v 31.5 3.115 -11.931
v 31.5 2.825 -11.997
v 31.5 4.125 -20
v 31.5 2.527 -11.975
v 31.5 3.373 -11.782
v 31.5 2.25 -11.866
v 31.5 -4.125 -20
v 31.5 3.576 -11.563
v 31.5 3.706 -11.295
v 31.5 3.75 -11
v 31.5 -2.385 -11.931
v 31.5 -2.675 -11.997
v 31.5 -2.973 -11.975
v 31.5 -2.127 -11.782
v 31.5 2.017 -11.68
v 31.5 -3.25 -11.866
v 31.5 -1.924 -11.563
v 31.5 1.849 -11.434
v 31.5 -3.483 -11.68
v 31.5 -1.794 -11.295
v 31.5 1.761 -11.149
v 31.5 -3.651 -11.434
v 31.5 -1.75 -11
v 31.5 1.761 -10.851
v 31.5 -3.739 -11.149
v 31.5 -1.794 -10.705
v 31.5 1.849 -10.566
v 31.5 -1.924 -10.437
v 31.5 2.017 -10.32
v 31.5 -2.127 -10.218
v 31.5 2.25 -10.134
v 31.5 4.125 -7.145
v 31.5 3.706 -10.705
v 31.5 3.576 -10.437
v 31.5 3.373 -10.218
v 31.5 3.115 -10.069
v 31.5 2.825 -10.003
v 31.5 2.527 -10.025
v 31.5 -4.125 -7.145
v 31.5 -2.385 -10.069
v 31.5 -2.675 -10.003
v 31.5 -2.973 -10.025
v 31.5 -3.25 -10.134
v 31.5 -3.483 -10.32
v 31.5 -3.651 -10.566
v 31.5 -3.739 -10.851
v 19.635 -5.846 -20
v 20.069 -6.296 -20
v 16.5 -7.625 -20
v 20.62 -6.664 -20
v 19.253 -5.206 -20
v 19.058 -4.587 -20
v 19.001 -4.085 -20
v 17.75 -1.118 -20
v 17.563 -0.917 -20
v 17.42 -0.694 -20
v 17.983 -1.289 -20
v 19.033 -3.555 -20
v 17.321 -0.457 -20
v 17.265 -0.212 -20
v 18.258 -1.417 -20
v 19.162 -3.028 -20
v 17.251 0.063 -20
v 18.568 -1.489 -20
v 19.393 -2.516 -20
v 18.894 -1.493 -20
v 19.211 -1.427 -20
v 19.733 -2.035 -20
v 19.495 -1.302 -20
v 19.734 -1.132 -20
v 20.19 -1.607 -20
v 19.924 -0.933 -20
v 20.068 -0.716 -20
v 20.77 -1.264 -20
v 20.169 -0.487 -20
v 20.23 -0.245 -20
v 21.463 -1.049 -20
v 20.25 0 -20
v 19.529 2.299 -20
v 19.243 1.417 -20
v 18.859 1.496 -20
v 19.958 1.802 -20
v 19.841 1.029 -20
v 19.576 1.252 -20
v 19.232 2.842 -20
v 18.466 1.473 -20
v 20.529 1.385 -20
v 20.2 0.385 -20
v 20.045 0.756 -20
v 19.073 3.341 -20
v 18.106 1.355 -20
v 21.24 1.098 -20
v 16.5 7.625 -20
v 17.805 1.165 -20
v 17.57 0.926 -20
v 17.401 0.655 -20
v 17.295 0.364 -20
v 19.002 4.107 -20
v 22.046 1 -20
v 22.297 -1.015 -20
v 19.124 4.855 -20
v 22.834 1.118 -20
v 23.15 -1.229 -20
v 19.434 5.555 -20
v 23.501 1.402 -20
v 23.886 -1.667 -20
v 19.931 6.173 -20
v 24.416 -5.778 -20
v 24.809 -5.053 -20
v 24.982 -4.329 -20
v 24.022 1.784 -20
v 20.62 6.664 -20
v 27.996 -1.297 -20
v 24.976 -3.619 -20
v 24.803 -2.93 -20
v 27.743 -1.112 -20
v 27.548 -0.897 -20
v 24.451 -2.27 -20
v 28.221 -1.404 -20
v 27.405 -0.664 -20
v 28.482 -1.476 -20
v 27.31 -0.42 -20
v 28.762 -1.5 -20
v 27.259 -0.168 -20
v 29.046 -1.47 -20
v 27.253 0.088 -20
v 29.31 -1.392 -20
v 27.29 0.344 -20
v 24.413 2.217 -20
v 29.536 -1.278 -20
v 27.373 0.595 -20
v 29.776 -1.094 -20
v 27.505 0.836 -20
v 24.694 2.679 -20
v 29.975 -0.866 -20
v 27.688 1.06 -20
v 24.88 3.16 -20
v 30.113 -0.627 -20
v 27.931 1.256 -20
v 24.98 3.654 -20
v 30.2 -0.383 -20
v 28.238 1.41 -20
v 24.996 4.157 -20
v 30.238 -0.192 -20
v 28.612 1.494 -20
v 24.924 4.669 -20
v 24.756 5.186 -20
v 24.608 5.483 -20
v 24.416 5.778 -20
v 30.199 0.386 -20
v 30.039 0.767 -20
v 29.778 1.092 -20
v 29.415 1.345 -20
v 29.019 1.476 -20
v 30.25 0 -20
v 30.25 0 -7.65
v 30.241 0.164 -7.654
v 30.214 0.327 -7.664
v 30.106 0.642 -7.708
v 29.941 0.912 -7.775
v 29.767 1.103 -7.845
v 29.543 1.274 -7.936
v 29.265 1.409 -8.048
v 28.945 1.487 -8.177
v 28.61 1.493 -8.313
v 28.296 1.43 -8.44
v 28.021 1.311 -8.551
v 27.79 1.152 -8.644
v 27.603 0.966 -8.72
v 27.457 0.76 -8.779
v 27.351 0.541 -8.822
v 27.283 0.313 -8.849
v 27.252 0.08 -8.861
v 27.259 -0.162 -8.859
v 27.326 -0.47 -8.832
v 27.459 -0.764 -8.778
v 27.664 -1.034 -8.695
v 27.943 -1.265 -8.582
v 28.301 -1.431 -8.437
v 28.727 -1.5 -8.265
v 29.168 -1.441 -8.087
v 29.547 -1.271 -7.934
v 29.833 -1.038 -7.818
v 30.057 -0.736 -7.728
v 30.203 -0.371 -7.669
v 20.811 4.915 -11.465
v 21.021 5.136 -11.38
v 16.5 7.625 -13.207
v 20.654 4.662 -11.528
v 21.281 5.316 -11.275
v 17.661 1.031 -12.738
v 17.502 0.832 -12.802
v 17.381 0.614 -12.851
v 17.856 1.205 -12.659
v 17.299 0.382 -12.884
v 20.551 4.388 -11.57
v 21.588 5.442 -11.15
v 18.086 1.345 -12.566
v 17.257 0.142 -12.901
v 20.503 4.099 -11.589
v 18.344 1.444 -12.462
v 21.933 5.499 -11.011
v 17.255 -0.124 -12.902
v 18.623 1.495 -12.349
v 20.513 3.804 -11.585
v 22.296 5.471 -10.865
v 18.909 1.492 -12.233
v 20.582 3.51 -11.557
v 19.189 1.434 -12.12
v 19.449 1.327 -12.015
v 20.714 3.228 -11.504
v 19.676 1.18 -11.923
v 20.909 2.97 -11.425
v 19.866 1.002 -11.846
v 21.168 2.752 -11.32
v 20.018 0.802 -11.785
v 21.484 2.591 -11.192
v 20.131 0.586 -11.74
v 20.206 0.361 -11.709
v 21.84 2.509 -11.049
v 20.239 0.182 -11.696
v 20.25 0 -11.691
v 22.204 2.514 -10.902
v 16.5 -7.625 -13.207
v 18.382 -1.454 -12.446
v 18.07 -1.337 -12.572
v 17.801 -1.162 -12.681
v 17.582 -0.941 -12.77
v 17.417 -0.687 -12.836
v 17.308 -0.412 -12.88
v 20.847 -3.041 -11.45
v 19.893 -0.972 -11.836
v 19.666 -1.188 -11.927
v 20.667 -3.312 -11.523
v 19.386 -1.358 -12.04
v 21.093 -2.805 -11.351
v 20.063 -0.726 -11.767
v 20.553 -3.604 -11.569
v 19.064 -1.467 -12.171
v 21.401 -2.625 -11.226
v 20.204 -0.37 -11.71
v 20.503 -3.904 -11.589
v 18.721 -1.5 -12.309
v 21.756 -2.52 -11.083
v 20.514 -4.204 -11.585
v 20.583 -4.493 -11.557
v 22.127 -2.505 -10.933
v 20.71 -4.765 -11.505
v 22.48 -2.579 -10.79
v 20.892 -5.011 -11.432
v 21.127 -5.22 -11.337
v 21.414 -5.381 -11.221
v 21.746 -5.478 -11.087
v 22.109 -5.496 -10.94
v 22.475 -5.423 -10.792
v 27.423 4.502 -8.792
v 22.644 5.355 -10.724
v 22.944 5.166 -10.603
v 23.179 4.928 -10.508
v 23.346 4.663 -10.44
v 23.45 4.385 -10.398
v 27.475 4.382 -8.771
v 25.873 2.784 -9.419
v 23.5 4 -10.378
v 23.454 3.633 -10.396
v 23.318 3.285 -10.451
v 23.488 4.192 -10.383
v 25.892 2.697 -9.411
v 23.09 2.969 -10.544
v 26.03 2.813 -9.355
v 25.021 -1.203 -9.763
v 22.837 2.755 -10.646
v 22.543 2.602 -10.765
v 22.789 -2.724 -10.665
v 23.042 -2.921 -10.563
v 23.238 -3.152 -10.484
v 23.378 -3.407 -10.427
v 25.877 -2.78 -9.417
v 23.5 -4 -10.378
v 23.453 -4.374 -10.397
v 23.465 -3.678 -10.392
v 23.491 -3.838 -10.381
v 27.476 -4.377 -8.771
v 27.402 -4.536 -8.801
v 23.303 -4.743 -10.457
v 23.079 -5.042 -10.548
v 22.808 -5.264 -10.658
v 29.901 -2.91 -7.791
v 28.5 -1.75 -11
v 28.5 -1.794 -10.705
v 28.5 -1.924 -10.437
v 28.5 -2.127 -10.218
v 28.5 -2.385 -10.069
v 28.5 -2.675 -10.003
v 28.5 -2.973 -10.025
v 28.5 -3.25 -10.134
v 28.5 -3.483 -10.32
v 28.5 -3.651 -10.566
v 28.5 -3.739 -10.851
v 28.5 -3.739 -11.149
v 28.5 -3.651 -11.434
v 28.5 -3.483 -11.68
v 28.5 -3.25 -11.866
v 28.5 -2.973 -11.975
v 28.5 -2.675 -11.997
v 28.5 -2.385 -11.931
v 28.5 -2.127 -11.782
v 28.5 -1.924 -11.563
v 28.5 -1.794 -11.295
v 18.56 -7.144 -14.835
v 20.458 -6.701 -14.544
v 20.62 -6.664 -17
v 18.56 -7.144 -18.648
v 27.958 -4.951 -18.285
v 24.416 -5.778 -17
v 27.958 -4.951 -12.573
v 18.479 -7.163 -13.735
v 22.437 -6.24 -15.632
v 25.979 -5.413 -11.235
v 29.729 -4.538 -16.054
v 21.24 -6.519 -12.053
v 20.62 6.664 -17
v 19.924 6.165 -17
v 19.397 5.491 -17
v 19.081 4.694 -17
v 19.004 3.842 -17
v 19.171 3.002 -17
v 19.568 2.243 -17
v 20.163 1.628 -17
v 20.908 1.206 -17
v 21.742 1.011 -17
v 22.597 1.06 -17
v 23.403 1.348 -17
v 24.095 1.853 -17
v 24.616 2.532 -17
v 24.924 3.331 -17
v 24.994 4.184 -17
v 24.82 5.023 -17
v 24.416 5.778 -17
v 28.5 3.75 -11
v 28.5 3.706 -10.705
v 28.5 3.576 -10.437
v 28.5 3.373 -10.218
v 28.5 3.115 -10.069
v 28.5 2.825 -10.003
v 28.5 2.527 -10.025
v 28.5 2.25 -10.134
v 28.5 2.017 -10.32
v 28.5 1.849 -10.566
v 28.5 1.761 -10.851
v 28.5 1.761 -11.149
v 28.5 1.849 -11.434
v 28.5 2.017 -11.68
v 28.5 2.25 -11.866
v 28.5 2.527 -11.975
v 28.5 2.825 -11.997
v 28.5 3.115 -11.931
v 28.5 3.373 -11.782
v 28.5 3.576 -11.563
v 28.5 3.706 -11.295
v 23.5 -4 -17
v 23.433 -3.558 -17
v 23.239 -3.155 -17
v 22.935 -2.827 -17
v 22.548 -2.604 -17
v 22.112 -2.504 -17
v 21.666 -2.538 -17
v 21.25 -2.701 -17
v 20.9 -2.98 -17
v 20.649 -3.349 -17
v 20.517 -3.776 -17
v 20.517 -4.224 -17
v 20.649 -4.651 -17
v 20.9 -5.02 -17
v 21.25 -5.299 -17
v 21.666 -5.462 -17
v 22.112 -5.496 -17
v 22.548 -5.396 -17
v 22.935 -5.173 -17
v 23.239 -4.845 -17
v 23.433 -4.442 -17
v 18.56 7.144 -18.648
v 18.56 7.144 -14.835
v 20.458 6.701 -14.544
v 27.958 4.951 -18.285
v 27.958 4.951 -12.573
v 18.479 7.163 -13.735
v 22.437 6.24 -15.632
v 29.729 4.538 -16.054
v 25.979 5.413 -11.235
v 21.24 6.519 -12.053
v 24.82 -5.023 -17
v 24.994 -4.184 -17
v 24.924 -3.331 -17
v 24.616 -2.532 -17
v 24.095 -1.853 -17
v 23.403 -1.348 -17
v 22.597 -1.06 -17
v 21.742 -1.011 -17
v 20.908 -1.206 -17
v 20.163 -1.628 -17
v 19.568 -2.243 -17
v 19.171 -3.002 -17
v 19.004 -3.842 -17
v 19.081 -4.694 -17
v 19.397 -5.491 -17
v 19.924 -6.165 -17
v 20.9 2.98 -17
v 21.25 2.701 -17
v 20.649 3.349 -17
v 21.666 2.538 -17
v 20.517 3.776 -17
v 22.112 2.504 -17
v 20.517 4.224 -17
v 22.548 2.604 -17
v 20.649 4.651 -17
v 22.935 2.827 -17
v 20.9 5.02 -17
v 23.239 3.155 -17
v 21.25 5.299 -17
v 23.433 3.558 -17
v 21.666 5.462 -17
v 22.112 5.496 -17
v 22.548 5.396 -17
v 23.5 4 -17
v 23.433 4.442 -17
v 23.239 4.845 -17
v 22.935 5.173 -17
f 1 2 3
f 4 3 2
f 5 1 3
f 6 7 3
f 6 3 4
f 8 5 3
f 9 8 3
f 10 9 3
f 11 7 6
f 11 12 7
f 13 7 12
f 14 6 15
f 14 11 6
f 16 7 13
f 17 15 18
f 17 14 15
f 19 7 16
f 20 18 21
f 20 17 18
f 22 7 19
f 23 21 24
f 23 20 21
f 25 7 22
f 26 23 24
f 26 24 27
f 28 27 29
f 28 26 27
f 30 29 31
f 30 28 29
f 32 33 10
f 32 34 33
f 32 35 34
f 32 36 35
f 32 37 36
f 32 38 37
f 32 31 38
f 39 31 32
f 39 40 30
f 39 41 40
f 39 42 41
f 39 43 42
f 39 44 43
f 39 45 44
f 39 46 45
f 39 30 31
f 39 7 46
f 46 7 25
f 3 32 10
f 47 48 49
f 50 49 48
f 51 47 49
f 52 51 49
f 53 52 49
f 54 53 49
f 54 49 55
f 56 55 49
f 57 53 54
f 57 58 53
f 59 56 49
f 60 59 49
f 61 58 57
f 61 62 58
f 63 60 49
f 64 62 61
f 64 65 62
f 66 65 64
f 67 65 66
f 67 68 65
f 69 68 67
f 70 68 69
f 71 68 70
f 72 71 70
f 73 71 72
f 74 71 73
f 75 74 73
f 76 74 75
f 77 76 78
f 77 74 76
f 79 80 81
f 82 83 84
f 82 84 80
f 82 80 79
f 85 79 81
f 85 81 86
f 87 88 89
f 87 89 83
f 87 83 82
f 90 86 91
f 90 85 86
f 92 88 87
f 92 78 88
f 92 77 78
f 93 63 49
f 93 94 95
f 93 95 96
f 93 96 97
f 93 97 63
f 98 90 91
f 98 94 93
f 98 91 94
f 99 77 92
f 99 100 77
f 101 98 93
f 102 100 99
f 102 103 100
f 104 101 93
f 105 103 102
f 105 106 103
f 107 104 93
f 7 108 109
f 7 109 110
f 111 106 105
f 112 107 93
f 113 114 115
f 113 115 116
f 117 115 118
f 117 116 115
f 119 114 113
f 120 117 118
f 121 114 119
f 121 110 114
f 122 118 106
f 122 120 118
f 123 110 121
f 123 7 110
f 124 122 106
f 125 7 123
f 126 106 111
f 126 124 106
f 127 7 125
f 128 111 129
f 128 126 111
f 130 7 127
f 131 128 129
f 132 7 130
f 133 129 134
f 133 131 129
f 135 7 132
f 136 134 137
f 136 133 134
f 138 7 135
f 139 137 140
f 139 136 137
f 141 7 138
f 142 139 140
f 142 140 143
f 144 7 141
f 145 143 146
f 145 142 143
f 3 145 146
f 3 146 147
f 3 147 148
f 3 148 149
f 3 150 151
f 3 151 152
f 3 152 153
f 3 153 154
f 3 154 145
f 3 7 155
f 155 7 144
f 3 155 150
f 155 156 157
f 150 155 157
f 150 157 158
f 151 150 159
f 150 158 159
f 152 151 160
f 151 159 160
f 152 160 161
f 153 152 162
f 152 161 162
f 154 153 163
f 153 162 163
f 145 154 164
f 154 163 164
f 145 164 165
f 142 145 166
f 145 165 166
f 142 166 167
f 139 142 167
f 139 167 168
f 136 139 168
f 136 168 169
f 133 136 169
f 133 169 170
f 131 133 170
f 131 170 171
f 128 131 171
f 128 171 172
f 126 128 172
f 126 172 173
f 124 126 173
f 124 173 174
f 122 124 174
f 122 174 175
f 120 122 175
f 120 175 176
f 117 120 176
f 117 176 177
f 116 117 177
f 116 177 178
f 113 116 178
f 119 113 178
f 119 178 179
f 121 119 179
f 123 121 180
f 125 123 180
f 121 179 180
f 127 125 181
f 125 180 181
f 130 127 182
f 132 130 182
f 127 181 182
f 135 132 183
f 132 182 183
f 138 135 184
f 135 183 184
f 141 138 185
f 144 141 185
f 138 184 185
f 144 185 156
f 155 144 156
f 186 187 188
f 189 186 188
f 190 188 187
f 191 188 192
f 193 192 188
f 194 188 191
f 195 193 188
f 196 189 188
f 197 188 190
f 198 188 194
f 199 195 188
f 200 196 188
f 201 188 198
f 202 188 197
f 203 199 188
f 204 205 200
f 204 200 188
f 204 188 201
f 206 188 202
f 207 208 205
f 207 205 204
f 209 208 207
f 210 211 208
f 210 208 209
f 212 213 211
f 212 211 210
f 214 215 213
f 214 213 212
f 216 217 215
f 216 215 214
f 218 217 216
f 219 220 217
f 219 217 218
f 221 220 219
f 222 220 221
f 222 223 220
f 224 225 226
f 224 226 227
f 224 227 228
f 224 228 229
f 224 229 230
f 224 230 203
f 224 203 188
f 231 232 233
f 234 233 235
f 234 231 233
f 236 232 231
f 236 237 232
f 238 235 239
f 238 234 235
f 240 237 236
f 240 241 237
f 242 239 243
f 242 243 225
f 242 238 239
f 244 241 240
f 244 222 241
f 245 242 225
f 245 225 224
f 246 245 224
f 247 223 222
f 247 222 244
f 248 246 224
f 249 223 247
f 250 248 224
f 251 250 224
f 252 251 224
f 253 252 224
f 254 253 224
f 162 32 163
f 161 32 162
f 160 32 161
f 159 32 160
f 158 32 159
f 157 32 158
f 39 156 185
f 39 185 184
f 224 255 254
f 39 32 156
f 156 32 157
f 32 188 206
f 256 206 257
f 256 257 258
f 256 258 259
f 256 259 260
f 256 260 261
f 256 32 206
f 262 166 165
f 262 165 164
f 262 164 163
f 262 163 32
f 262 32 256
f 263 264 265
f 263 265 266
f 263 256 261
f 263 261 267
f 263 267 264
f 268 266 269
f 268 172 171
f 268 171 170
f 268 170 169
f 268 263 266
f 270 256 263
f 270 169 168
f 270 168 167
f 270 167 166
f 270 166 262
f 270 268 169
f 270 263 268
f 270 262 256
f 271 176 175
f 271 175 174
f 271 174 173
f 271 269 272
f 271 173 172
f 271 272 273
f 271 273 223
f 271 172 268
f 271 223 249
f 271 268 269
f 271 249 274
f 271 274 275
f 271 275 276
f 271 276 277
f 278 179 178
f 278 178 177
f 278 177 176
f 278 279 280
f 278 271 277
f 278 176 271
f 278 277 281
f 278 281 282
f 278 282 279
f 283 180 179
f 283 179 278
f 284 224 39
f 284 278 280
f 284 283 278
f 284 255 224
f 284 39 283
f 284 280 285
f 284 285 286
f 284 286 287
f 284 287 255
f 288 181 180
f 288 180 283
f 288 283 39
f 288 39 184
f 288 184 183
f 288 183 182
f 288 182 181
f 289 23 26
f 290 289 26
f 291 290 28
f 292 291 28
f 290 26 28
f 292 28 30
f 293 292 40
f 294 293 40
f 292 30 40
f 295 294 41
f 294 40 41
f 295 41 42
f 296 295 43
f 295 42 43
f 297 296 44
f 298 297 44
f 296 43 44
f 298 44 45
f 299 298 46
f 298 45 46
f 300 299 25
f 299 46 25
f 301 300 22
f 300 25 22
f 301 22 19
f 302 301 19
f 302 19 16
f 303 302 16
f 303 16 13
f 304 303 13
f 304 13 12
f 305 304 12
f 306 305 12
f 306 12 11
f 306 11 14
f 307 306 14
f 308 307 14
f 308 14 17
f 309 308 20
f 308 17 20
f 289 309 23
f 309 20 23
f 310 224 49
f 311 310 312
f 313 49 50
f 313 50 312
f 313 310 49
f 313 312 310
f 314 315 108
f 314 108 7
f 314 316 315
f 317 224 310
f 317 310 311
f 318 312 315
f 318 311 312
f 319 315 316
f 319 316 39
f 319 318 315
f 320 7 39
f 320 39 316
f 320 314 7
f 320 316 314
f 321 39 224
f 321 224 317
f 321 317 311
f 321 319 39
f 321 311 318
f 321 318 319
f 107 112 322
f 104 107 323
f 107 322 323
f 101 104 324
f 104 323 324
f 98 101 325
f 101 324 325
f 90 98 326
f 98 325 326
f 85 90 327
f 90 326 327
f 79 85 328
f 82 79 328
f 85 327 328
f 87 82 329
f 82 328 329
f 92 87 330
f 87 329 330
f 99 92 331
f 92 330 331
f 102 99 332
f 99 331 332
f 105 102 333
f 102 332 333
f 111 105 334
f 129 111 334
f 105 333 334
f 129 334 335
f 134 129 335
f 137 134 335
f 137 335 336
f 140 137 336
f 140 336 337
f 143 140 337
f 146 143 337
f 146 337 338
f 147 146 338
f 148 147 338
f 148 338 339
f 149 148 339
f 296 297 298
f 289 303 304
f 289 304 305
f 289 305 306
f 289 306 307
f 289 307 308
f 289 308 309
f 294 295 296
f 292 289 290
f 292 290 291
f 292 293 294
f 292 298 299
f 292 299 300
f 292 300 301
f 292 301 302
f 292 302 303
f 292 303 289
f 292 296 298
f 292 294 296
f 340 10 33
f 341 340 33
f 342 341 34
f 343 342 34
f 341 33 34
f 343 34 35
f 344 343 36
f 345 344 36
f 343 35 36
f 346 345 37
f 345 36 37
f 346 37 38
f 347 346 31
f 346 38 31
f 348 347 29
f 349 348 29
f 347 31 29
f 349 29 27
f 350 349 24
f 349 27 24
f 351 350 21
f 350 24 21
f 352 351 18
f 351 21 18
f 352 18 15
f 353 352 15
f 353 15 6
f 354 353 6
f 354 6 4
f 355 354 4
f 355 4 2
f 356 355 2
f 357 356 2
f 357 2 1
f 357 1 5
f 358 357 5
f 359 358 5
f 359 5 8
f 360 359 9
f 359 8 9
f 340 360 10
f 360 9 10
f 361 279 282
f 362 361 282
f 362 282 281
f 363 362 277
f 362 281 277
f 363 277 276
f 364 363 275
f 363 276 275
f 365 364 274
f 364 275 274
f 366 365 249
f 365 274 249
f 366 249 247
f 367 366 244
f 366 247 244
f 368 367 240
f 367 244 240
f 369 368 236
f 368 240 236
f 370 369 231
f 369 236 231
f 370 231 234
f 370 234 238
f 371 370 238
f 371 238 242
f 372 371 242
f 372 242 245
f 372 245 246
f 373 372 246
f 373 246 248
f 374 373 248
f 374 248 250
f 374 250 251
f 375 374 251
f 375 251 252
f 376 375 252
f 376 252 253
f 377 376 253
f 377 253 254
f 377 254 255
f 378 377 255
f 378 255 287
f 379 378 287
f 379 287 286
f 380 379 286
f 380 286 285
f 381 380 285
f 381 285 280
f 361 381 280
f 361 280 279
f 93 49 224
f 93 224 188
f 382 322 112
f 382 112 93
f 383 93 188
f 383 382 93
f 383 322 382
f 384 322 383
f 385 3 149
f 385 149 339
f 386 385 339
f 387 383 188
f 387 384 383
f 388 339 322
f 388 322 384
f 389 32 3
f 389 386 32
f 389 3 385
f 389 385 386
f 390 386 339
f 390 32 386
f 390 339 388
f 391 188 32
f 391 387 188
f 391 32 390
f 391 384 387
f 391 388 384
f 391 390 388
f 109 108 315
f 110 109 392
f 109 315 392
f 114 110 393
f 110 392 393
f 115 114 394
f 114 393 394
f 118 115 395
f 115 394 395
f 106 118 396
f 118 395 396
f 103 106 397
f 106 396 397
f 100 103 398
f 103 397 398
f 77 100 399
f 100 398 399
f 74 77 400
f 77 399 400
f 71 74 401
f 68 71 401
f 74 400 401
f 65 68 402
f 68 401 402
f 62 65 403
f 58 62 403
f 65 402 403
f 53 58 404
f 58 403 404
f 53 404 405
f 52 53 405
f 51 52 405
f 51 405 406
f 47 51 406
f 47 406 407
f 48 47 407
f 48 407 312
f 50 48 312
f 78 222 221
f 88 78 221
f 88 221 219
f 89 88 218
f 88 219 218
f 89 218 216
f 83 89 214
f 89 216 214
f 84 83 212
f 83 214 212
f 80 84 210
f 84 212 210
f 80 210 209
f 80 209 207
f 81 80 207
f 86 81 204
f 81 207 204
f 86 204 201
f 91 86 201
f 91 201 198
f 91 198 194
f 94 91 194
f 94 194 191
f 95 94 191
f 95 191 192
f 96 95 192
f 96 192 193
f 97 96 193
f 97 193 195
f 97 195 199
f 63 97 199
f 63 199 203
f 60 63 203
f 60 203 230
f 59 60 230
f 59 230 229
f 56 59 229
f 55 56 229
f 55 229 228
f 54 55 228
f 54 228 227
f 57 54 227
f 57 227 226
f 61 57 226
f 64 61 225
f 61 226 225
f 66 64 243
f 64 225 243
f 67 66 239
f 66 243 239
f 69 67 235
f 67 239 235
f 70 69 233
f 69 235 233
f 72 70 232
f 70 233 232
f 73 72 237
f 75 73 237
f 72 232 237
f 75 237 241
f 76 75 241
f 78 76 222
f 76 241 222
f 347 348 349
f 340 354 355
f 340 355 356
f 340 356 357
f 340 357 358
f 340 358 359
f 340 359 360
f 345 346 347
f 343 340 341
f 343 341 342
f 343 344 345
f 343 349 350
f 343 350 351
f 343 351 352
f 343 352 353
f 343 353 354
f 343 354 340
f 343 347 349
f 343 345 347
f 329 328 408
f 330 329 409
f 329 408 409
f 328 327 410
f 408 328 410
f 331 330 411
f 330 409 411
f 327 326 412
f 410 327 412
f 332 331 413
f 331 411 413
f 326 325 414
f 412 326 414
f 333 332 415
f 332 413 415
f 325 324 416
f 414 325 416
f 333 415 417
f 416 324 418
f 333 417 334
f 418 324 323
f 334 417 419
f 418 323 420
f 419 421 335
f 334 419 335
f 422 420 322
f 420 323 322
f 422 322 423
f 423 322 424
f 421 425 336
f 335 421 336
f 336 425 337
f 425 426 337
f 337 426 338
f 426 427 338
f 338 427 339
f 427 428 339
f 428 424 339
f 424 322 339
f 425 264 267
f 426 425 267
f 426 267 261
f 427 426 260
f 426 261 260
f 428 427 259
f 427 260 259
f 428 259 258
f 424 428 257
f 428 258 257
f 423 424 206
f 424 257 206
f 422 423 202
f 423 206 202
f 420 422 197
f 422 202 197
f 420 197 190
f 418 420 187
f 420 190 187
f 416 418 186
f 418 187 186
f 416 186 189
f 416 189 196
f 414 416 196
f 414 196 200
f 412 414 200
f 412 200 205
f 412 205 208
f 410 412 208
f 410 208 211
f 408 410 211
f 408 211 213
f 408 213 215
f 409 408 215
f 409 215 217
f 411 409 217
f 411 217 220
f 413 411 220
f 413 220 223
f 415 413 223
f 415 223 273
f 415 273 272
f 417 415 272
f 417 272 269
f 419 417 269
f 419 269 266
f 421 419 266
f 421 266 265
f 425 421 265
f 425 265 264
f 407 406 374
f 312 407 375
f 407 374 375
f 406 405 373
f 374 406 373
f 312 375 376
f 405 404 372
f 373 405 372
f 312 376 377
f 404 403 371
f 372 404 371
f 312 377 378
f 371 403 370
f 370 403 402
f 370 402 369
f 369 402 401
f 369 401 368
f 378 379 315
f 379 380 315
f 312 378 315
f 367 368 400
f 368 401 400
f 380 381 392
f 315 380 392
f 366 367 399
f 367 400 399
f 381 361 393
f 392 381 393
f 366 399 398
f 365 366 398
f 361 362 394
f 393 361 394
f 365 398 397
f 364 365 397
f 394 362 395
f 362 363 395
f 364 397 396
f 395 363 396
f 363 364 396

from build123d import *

# Parameters (mm, degrees)
SKETCH065_R  = 1
PAD047_DEPTH = 3
SKETCH056_R  = 3
PAD039_DEPTH = 10
SKETCH055_R  = 1.5
PAD038_DEPTH = 100
SKETCH057_R  = 1.5
PAD040_DEPTH = 100
SKETCH053_W  = 15.25
SKETCH053_H  = 6.793113
SKETCH054_W  = 8.25
SKETCH054_H  = 12.85529


with BuildPart() as pad047:
    # Sketch065 → Pad047 (new body)
    with BuildSketch(Plane.YZ.offset(31.5)):
        with Locations((2.75, -11)):
            Circle(SKETCH065_R)
        with Locations((-2.75, -11)):
            Circle(SKETCH065_R)
    extrude(amount=-PAD047_DEPTH)


with BuildPart() as mountingblockscrewcountersink:
    # Sketch056 → Pad039 (new body)
    with BuildSketch(Plane.XY.offset(-17)):
        with Locations((22, 4)):
            Circle(SKETCH056_R)
        with Locations((22, -4)):
            Circle(SKETCH056_R)
    extrude(amount=-PAD039_DEPTH)


with BuildPart() as mountingblockscrewcutout:
    # Sketch055 → Pad038 (new body)
    with BuildSketch(Plane.XY):
        with Locations((22, 4)):
            Circle(SKETCH055_R)
        with Locations((22, -4)):
            Circle(SKETCH055_R)
    extrude(amount=-PAD038_DEPTH)


with BuildPart() as cutouts:
    # Sketch057 → Pad040 (new body)
    with BuildSketch(Plane.XY):
        with Locations((28.75, 0)):
            Circle(SKETCH057_R)
        with Locations((18.75, 0)):
            Circle(SKETCH057_R)
    extrude(amount=-PAD040_DEPTH)

    # Fusion004011: union MountingBlockScrewCountersink, MountingBlockScrewCutout
    add(mountingblockscrewcountersink.part)
    add(mountingblockscrewcutout.part)


with BuildPart() as mountingblockpad:
    # Sketch053 → Loft003 section 0
    with BuildSketch(Plane.YZ.offset(16.5)):
        with Locations((0, -16.603444)):
            Rectangle(SKETCH053_W, SKETCH053_H)
    # Sketch054 → Loft003 section 1
    with BuildSketch(Plane.YZ.offset(31.5)):
        with Locations((0, -13.572355)):
            Rectangle(SKETCH054_W, SKETCH054_H)
    loft(ruled=True)

    # Cut007011: cut Cutouts
    add(cutouts.part, mode=Mode.SUBTRACT)

    # Cut007016: cut Pad047
    add(pad047.part, mode=Mode.SUBTRACT)


solid = mountingblockpad.part
